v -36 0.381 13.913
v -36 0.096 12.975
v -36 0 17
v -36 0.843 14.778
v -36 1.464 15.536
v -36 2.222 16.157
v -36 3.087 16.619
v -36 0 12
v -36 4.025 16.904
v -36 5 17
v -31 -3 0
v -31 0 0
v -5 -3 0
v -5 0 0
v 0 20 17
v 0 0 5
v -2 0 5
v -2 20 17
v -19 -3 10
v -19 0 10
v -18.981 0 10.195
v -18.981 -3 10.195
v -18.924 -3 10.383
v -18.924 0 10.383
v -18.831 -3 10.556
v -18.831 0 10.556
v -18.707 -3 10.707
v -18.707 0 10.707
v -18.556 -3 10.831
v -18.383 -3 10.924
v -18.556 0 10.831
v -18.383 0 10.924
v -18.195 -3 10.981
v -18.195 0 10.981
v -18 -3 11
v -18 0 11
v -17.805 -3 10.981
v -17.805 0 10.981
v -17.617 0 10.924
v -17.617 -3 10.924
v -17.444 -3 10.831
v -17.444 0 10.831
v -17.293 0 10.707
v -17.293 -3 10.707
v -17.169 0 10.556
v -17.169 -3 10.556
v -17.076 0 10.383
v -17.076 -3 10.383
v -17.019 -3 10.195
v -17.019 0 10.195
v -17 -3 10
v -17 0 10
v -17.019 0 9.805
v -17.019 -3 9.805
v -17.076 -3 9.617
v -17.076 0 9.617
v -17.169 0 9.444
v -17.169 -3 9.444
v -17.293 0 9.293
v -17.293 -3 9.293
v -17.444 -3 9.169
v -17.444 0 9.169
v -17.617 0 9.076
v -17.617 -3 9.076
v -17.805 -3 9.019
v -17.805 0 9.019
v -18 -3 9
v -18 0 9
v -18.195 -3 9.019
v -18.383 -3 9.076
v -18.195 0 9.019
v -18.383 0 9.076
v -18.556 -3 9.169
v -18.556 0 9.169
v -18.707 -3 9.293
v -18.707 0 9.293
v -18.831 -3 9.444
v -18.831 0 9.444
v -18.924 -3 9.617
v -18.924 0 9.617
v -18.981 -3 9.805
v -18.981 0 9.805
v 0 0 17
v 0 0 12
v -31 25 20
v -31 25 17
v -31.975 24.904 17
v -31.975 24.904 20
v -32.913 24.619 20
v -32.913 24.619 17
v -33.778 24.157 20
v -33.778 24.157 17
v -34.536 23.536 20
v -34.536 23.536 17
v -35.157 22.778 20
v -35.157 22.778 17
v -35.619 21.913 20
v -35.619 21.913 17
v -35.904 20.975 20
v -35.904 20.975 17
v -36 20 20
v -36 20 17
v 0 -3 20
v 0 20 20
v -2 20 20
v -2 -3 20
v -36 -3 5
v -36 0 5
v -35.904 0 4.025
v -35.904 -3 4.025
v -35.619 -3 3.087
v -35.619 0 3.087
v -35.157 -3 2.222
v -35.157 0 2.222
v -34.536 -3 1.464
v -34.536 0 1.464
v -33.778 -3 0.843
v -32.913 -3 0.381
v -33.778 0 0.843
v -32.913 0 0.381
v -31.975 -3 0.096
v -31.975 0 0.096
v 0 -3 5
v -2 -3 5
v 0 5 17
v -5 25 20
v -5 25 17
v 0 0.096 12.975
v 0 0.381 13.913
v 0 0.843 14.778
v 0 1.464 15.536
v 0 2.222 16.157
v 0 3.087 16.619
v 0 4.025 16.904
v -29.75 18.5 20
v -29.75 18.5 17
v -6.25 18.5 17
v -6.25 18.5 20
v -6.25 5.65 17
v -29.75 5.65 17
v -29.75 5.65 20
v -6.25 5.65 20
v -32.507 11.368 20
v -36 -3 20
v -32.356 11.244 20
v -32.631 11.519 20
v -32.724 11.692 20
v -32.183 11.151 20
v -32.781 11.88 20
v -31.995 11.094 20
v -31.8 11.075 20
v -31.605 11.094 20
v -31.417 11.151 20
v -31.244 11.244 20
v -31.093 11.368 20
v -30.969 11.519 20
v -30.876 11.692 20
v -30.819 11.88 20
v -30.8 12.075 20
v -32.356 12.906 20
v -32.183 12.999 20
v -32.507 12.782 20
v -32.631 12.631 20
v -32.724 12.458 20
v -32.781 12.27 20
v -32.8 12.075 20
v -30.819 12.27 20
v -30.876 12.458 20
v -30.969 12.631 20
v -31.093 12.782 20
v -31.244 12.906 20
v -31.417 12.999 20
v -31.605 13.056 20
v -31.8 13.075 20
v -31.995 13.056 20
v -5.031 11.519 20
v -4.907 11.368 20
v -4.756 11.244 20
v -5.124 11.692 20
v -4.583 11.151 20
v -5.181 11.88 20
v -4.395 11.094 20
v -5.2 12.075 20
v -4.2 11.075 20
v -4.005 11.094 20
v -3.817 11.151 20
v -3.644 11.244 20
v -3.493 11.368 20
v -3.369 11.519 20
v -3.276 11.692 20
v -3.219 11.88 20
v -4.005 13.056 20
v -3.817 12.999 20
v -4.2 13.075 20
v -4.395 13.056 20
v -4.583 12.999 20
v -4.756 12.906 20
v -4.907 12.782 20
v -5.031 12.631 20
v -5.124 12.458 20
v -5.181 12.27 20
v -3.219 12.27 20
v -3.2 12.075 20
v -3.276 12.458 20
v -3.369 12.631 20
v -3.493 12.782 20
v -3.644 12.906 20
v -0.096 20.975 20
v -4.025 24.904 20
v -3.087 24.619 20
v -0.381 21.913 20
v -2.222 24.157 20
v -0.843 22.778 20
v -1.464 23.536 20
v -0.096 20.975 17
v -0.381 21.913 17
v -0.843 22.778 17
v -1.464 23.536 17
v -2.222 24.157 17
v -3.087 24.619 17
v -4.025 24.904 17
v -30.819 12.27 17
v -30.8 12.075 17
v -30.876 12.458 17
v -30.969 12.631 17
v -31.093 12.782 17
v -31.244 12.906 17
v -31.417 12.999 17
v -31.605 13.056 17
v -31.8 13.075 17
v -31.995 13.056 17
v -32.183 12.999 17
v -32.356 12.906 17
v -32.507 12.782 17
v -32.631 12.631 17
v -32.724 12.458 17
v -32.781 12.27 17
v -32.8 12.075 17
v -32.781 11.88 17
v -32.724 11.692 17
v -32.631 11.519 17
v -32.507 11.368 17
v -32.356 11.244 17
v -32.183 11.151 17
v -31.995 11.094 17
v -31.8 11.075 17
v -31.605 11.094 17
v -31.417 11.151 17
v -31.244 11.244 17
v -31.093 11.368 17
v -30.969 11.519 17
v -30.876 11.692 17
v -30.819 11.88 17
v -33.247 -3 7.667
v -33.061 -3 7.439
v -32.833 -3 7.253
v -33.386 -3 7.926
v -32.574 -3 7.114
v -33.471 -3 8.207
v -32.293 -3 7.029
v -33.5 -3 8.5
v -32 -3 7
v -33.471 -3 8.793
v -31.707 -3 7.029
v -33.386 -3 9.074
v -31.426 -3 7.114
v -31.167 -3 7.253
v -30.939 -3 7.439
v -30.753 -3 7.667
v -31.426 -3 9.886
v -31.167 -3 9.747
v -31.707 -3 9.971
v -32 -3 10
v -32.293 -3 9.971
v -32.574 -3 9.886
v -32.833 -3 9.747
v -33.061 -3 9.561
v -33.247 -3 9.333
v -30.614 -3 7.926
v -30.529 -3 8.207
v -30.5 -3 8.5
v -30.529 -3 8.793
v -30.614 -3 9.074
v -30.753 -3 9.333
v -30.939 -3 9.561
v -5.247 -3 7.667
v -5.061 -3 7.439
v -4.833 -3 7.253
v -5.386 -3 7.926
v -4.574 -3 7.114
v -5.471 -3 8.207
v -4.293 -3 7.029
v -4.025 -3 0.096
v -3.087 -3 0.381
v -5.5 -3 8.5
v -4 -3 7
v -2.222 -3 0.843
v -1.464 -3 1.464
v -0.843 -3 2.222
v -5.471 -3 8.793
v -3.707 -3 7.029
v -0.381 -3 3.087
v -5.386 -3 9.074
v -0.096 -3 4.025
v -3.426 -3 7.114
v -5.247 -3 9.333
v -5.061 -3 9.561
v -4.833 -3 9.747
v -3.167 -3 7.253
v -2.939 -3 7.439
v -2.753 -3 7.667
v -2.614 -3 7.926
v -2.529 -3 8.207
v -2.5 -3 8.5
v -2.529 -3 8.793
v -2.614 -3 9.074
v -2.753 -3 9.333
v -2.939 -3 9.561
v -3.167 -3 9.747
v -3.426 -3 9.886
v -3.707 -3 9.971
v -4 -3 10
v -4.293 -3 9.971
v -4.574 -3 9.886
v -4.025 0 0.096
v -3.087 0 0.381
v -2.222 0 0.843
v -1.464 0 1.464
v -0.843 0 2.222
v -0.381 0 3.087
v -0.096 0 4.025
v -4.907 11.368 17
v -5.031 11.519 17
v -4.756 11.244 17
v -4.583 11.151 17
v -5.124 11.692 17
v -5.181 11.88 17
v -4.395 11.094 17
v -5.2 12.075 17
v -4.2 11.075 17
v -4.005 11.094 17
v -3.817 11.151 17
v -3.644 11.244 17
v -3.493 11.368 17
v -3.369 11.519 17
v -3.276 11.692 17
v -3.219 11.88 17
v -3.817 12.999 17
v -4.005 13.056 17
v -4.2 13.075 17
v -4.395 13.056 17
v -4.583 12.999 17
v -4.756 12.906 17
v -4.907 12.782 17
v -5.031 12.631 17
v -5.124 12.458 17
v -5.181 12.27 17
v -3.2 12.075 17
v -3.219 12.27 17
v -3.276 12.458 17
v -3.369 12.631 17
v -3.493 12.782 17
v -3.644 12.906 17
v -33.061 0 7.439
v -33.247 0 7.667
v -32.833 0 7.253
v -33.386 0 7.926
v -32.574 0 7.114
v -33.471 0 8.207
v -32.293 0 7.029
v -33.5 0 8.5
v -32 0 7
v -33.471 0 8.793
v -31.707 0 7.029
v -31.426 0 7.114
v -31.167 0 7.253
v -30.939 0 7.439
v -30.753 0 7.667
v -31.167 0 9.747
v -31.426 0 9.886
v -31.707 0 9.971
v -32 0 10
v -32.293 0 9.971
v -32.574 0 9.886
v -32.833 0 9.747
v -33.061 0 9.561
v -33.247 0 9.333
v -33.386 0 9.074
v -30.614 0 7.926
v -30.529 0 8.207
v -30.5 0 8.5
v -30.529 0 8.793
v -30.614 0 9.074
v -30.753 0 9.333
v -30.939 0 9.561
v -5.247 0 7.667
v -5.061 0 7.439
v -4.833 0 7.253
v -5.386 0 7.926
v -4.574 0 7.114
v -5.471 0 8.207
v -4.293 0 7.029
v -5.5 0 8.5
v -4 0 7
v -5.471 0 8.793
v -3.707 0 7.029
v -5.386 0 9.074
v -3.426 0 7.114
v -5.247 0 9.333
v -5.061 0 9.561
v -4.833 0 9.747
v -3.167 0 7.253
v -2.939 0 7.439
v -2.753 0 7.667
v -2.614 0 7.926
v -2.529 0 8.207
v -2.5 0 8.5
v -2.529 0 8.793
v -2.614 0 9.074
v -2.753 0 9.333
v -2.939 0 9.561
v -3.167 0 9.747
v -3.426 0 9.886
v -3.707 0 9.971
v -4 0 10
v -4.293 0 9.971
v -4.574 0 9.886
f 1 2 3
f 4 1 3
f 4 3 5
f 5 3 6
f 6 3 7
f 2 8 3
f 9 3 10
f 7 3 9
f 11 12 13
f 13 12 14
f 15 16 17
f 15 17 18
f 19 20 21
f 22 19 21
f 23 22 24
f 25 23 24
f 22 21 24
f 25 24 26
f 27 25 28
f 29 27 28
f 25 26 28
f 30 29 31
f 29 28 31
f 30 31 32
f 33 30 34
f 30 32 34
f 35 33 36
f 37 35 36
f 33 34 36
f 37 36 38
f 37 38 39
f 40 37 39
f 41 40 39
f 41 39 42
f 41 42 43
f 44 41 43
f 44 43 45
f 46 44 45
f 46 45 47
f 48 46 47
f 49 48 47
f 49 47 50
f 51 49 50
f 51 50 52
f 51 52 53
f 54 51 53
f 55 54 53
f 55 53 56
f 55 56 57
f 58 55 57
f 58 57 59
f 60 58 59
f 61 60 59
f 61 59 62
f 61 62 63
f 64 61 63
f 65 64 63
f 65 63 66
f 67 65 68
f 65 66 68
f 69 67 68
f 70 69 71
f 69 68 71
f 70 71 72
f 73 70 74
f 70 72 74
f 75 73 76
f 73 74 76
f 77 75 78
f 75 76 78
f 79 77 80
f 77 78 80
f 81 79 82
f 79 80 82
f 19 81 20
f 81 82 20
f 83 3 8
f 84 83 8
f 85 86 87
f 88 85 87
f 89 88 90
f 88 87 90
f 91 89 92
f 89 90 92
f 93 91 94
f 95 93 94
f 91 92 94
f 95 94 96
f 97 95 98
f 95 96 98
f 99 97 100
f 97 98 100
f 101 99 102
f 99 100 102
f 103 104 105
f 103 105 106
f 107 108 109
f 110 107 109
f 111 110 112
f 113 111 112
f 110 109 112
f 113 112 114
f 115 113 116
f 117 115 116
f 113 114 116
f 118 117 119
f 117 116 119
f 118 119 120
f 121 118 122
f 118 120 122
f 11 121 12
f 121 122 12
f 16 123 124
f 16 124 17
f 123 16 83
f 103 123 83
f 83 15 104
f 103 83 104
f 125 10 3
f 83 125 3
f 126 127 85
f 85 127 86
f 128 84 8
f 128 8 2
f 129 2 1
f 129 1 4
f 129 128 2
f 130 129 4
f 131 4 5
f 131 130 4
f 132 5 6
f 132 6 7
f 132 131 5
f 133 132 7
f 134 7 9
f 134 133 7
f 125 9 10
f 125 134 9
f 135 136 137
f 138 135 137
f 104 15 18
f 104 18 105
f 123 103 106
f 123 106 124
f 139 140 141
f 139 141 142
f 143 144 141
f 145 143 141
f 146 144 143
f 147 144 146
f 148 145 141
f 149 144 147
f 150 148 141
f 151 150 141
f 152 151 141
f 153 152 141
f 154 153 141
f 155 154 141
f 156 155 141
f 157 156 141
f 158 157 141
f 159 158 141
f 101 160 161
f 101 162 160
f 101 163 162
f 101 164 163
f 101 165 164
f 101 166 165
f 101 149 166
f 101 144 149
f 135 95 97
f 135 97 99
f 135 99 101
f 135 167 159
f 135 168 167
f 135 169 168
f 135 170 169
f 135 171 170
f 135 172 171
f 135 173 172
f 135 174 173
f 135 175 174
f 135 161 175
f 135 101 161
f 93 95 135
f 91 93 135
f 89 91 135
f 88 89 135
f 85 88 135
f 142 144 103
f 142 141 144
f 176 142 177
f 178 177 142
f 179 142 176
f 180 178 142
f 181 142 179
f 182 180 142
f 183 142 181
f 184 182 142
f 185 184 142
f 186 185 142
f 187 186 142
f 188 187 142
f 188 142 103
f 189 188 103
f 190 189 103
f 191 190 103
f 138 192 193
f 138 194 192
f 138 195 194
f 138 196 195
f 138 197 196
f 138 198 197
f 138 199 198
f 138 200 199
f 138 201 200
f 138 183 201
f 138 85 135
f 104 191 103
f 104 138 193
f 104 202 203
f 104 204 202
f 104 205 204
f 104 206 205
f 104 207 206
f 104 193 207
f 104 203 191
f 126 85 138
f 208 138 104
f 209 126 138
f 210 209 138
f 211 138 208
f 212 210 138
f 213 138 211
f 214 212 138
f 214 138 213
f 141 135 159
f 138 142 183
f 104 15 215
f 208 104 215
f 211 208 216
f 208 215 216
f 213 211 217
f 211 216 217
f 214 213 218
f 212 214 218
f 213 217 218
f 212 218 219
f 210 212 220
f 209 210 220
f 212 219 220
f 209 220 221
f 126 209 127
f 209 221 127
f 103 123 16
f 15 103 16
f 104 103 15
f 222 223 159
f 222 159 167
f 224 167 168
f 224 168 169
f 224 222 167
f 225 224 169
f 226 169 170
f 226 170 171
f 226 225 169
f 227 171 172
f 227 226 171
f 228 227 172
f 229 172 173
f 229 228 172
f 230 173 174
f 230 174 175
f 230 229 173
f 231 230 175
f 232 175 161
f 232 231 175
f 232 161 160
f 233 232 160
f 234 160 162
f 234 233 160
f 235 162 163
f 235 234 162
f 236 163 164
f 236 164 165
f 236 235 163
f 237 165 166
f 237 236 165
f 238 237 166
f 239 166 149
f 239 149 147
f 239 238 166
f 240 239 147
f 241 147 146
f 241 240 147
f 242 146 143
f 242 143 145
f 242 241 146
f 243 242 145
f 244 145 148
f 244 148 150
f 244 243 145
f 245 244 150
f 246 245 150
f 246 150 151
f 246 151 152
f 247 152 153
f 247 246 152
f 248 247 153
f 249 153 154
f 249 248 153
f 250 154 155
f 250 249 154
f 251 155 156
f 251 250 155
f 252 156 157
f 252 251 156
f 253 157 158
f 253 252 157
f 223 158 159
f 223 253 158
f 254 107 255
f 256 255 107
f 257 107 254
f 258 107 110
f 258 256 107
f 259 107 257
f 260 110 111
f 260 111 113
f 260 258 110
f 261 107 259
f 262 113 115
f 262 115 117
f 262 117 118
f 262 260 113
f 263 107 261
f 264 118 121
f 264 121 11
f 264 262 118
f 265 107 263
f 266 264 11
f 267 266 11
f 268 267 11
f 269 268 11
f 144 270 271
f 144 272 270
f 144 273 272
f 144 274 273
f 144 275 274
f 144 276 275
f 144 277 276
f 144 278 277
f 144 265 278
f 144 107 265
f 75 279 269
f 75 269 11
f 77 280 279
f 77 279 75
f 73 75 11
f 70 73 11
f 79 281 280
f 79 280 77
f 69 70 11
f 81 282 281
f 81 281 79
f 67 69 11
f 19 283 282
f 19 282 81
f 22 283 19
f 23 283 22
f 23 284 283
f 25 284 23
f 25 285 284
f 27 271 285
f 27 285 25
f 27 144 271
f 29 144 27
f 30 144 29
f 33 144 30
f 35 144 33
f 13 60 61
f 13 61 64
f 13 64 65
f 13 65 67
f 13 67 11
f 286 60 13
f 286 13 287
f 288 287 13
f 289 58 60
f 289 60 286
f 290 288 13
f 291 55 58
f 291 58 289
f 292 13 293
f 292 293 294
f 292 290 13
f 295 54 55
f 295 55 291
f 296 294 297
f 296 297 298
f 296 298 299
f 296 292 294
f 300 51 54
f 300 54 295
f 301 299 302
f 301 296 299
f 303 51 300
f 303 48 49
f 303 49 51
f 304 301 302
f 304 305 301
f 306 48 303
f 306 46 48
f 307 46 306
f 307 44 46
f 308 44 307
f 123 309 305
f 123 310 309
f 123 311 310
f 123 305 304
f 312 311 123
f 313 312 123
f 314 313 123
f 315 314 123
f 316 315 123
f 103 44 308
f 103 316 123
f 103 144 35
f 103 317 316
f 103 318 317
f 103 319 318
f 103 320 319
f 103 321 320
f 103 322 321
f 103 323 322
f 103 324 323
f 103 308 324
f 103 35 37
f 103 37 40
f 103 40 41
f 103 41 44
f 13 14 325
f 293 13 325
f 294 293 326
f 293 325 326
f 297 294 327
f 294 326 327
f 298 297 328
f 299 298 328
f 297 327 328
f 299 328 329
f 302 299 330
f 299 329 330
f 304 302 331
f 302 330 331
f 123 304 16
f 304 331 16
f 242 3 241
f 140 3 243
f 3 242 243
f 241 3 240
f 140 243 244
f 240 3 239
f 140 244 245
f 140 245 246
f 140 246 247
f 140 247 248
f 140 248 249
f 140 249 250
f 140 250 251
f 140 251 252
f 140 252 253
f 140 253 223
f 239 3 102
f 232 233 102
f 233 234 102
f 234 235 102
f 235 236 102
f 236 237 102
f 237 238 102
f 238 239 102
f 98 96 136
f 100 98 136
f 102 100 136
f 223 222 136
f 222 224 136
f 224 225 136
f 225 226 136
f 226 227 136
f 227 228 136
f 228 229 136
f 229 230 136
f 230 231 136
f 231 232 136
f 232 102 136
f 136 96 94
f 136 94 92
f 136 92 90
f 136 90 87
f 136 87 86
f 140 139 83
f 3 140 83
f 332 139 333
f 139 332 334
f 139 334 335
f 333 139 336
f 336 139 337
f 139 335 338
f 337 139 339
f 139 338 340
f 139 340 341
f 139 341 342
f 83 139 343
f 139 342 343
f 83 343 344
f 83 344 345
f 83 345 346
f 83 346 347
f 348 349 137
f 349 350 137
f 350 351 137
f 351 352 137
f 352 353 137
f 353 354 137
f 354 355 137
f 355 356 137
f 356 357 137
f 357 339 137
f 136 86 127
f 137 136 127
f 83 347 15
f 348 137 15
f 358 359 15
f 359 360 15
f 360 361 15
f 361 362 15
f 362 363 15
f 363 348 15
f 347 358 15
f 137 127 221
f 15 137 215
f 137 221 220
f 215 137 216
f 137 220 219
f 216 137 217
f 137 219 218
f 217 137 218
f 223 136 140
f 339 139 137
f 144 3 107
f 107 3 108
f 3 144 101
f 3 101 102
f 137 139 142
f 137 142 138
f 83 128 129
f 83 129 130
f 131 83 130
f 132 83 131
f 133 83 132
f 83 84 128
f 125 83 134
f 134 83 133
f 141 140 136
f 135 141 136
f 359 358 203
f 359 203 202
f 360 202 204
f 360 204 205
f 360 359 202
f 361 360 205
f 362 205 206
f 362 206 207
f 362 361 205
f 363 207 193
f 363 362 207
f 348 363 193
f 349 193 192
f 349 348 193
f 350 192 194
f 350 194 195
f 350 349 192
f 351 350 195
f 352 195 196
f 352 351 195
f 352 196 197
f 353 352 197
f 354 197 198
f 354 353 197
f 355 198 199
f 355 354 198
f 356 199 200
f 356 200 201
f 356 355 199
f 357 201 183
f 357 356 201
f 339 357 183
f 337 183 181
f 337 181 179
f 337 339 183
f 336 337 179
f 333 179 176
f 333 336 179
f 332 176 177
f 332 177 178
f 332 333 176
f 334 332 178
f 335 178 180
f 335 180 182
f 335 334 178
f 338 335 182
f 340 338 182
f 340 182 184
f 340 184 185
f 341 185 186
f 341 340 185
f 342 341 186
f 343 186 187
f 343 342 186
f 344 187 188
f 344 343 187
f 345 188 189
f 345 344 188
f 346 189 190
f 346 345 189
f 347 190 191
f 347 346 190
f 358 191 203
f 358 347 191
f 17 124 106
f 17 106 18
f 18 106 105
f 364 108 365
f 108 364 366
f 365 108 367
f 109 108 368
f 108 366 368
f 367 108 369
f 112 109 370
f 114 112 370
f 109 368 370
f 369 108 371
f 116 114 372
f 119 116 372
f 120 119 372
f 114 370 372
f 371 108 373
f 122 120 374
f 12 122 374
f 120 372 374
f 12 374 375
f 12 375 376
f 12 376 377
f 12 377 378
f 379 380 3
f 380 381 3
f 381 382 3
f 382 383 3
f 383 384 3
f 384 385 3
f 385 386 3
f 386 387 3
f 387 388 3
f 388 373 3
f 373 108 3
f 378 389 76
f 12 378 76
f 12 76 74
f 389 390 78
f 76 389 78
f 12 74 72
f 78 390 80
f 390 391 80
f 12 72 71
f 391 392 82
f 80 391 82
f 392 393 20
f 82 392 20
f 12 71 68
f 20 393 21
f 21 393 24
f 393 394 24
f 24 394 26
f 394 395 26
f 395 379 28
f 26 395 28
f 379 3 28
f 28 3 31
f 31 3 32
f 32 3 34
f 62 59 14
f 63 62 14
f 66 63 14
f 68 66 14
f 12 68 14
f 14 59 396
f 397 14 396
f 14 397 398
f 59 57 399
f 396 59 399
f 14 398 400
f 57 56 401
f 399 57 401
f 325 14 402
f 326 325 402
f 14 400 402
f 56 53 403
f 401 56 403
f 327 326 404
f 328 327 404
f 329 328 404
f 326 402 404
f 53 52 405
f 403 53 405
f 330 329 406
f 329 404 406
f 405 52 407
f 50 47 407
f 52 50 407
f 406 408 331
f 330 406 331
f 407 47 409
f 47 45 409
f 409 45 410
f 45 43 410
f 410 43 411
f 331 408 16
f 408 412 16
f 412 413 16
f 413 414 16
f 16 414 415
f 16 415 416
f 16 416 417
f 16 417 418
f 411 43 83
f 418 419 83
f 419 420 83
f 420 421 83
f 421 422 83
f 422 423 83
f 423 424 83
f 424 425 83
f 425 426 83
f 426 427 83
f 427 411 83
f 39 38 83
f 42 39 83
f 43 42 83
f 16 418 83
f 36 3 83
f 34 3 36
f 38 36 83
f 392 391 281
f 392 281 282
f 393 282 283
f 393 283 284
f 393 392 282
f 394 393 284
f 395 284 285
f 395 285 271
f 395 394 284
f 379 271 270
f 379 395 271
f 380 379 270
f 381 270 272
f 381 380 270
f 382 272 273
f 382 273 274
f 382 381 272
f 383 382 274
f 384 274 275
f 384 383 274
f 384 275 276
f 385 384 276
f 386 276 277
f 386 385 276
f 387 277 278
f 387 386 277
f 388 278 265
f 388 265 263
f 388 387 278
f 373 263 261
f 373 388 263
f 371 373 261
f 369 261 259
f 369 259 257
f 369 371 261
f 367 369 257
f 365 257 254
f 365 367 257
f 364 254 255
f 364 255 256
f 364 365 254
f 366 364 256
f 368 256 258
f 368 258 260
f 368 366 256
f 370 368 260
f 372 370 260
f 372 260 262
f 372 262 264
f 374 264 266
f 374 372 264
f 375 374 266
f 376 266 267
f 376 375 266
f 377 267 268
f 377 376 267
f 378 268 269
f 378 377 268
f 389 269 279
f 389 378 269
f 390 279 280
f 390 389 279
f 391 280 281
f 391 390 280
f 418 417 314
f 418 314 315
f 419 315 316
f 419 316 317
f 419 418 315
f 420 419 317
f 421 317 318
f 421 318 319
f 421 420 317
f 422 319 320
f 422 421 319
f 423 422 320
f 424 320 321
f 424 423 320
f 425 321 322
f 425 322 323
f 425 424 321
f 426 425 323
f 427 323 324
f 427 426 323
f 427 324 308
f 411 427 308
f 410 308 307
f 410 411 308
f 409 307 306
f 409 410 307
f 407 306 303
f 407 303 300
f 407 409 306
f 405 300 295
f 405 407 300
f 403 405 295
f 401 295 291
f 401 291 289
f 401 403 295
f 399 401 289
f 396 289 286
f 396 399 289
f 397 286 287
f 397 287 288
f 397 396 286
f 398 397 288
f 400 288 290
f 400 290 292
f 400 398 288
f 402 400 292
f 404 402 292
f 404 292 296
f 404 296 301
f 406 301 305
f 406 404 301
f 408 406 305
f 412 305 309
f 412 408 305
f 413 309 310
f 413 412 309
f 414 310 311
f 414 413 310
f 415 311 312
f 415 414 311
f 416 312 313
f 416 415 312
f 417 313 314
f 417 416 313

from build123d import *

# Parameters (mm, degrees)
F0_R       = 1.5
F1_DEPTH   = 3
F1_FACE1_W = 26
F1_FACE1_H = 3
F2_R       = 1
F2_W       = 23.5
F2_H       = 12.85
F2_W_2     = 36
F2_H_2     = 3
F3_DEPTH   = 3
F5_DEPTH   = 36
F6_R       = 1
F7_DEPTH   = 3.001
F9_DEPTH   = 2


with BuildPart() as f1:
    # F0 (on Front) → F1 (new body)
    with BuildSketch(Plane.XZ):
        with BuildLine():
            Line((-31, 0), (-5, 0))
            ThreePointArc((-5, 0), (-1.4644660941, 1.4644660941), (0, 5))
            Line((0, 5), (0, 17))
            Line((0, 17), (-36, 17))
            Line((-36, 17), (-36, 5))
            ThreePointArc((-36, 5), (-34.5355339059, 1.4644660941), (-31, 0))
        make_face()
        with Locations((-32, 8.5)):
            Circle(F0_R, mode=Mode.SUBTRACT)
        with Locations((-4, 8.5)):
            Circle(F0_R, mode=Mode.SUBTRACT)
    extrude(amount=F1_DEPTH)

    # F1_face1 (on face) + F2 (on face) → F3 (join)
    with BuildSketch(Plane(origin=(-18, -1.5, 0), x_dir=(1, 0, 0), z_dir=(0, 0, -1))):
        Rectangle(F1_FACE1_W, F1_FACE1_H)
    with BuildSketch(Plane.XY.offset(17)):
        with BuildLine():
            Line((-36, 20), (-36, 0))
            Line((-36, 0), (0, 0))
            Line((0, 0), (0, 20))
            ThreePointArc((0, 20), (-1.4644660941, 23.5355339059), (-5, 25))
            Line((-5, 25), (-31, 25))
            ThreePointArc((-31, 25), (-34.5355339059, 23.5355339059), (-36, 20))
        make_face()
        with Locations((-31.8, 12.075)):
            Circle(F2_R, mode=Mode.SUBTRACT)
        with Locations((-18, 12.075)):
            Rectangle(F2_W, F2_H, mode=Mode.SUBTRACT)
        with Locations((-4.2, 12.075)):
            Circle(F2_R, mode=Mode.SUBTRACT)
        with Locations((-18, -1.5)):
            Rectangle(F2_W_2, F2_H_2)
    extrude(amount=-F3_DEPTH, dir=(0, 0, -1))

    # F6 (on face) → F7 (cut, through all)
    with BuildSketch(Plane(origin=(0, 0, 0), x_dir=(-1, 0, 0), z_dir=(0, 1, 0))):
        with Locations((18, 10)):
            Circle(F6_R)
    extrude(amount=-F7_DEPTH, mode=Mode.SUBTRACT)


with BuildPart() as f5:
    # F4 (on face) → F5 (new body)
    with BuildSketch(Plane.YZ):
        with BuildLine():
            Line((0, 17), (0, 12))
            ThreePointArc((0, 12), (1.4644660941, 15.5355339059), (5, 17))
            Line((5, 17), (0, 17))
        make_face()
    extrude(amount=-F5_DEPTH)


with BuildPart() as f9:
    # F8 (on face) → F9 (new body)
    with BuildSketch(Plane.YZ):
        Polygon((0, 5), (20, 17), (0, 17), align=None)
        Polygon((0, 17), (20, 17), (20, 20), (-3, 20), (-3, 5), (0, 5), align=None)
    extrude(amount=-F9_DEPTH)


solid = Compound([f1.part, f5.part, f9.part])
